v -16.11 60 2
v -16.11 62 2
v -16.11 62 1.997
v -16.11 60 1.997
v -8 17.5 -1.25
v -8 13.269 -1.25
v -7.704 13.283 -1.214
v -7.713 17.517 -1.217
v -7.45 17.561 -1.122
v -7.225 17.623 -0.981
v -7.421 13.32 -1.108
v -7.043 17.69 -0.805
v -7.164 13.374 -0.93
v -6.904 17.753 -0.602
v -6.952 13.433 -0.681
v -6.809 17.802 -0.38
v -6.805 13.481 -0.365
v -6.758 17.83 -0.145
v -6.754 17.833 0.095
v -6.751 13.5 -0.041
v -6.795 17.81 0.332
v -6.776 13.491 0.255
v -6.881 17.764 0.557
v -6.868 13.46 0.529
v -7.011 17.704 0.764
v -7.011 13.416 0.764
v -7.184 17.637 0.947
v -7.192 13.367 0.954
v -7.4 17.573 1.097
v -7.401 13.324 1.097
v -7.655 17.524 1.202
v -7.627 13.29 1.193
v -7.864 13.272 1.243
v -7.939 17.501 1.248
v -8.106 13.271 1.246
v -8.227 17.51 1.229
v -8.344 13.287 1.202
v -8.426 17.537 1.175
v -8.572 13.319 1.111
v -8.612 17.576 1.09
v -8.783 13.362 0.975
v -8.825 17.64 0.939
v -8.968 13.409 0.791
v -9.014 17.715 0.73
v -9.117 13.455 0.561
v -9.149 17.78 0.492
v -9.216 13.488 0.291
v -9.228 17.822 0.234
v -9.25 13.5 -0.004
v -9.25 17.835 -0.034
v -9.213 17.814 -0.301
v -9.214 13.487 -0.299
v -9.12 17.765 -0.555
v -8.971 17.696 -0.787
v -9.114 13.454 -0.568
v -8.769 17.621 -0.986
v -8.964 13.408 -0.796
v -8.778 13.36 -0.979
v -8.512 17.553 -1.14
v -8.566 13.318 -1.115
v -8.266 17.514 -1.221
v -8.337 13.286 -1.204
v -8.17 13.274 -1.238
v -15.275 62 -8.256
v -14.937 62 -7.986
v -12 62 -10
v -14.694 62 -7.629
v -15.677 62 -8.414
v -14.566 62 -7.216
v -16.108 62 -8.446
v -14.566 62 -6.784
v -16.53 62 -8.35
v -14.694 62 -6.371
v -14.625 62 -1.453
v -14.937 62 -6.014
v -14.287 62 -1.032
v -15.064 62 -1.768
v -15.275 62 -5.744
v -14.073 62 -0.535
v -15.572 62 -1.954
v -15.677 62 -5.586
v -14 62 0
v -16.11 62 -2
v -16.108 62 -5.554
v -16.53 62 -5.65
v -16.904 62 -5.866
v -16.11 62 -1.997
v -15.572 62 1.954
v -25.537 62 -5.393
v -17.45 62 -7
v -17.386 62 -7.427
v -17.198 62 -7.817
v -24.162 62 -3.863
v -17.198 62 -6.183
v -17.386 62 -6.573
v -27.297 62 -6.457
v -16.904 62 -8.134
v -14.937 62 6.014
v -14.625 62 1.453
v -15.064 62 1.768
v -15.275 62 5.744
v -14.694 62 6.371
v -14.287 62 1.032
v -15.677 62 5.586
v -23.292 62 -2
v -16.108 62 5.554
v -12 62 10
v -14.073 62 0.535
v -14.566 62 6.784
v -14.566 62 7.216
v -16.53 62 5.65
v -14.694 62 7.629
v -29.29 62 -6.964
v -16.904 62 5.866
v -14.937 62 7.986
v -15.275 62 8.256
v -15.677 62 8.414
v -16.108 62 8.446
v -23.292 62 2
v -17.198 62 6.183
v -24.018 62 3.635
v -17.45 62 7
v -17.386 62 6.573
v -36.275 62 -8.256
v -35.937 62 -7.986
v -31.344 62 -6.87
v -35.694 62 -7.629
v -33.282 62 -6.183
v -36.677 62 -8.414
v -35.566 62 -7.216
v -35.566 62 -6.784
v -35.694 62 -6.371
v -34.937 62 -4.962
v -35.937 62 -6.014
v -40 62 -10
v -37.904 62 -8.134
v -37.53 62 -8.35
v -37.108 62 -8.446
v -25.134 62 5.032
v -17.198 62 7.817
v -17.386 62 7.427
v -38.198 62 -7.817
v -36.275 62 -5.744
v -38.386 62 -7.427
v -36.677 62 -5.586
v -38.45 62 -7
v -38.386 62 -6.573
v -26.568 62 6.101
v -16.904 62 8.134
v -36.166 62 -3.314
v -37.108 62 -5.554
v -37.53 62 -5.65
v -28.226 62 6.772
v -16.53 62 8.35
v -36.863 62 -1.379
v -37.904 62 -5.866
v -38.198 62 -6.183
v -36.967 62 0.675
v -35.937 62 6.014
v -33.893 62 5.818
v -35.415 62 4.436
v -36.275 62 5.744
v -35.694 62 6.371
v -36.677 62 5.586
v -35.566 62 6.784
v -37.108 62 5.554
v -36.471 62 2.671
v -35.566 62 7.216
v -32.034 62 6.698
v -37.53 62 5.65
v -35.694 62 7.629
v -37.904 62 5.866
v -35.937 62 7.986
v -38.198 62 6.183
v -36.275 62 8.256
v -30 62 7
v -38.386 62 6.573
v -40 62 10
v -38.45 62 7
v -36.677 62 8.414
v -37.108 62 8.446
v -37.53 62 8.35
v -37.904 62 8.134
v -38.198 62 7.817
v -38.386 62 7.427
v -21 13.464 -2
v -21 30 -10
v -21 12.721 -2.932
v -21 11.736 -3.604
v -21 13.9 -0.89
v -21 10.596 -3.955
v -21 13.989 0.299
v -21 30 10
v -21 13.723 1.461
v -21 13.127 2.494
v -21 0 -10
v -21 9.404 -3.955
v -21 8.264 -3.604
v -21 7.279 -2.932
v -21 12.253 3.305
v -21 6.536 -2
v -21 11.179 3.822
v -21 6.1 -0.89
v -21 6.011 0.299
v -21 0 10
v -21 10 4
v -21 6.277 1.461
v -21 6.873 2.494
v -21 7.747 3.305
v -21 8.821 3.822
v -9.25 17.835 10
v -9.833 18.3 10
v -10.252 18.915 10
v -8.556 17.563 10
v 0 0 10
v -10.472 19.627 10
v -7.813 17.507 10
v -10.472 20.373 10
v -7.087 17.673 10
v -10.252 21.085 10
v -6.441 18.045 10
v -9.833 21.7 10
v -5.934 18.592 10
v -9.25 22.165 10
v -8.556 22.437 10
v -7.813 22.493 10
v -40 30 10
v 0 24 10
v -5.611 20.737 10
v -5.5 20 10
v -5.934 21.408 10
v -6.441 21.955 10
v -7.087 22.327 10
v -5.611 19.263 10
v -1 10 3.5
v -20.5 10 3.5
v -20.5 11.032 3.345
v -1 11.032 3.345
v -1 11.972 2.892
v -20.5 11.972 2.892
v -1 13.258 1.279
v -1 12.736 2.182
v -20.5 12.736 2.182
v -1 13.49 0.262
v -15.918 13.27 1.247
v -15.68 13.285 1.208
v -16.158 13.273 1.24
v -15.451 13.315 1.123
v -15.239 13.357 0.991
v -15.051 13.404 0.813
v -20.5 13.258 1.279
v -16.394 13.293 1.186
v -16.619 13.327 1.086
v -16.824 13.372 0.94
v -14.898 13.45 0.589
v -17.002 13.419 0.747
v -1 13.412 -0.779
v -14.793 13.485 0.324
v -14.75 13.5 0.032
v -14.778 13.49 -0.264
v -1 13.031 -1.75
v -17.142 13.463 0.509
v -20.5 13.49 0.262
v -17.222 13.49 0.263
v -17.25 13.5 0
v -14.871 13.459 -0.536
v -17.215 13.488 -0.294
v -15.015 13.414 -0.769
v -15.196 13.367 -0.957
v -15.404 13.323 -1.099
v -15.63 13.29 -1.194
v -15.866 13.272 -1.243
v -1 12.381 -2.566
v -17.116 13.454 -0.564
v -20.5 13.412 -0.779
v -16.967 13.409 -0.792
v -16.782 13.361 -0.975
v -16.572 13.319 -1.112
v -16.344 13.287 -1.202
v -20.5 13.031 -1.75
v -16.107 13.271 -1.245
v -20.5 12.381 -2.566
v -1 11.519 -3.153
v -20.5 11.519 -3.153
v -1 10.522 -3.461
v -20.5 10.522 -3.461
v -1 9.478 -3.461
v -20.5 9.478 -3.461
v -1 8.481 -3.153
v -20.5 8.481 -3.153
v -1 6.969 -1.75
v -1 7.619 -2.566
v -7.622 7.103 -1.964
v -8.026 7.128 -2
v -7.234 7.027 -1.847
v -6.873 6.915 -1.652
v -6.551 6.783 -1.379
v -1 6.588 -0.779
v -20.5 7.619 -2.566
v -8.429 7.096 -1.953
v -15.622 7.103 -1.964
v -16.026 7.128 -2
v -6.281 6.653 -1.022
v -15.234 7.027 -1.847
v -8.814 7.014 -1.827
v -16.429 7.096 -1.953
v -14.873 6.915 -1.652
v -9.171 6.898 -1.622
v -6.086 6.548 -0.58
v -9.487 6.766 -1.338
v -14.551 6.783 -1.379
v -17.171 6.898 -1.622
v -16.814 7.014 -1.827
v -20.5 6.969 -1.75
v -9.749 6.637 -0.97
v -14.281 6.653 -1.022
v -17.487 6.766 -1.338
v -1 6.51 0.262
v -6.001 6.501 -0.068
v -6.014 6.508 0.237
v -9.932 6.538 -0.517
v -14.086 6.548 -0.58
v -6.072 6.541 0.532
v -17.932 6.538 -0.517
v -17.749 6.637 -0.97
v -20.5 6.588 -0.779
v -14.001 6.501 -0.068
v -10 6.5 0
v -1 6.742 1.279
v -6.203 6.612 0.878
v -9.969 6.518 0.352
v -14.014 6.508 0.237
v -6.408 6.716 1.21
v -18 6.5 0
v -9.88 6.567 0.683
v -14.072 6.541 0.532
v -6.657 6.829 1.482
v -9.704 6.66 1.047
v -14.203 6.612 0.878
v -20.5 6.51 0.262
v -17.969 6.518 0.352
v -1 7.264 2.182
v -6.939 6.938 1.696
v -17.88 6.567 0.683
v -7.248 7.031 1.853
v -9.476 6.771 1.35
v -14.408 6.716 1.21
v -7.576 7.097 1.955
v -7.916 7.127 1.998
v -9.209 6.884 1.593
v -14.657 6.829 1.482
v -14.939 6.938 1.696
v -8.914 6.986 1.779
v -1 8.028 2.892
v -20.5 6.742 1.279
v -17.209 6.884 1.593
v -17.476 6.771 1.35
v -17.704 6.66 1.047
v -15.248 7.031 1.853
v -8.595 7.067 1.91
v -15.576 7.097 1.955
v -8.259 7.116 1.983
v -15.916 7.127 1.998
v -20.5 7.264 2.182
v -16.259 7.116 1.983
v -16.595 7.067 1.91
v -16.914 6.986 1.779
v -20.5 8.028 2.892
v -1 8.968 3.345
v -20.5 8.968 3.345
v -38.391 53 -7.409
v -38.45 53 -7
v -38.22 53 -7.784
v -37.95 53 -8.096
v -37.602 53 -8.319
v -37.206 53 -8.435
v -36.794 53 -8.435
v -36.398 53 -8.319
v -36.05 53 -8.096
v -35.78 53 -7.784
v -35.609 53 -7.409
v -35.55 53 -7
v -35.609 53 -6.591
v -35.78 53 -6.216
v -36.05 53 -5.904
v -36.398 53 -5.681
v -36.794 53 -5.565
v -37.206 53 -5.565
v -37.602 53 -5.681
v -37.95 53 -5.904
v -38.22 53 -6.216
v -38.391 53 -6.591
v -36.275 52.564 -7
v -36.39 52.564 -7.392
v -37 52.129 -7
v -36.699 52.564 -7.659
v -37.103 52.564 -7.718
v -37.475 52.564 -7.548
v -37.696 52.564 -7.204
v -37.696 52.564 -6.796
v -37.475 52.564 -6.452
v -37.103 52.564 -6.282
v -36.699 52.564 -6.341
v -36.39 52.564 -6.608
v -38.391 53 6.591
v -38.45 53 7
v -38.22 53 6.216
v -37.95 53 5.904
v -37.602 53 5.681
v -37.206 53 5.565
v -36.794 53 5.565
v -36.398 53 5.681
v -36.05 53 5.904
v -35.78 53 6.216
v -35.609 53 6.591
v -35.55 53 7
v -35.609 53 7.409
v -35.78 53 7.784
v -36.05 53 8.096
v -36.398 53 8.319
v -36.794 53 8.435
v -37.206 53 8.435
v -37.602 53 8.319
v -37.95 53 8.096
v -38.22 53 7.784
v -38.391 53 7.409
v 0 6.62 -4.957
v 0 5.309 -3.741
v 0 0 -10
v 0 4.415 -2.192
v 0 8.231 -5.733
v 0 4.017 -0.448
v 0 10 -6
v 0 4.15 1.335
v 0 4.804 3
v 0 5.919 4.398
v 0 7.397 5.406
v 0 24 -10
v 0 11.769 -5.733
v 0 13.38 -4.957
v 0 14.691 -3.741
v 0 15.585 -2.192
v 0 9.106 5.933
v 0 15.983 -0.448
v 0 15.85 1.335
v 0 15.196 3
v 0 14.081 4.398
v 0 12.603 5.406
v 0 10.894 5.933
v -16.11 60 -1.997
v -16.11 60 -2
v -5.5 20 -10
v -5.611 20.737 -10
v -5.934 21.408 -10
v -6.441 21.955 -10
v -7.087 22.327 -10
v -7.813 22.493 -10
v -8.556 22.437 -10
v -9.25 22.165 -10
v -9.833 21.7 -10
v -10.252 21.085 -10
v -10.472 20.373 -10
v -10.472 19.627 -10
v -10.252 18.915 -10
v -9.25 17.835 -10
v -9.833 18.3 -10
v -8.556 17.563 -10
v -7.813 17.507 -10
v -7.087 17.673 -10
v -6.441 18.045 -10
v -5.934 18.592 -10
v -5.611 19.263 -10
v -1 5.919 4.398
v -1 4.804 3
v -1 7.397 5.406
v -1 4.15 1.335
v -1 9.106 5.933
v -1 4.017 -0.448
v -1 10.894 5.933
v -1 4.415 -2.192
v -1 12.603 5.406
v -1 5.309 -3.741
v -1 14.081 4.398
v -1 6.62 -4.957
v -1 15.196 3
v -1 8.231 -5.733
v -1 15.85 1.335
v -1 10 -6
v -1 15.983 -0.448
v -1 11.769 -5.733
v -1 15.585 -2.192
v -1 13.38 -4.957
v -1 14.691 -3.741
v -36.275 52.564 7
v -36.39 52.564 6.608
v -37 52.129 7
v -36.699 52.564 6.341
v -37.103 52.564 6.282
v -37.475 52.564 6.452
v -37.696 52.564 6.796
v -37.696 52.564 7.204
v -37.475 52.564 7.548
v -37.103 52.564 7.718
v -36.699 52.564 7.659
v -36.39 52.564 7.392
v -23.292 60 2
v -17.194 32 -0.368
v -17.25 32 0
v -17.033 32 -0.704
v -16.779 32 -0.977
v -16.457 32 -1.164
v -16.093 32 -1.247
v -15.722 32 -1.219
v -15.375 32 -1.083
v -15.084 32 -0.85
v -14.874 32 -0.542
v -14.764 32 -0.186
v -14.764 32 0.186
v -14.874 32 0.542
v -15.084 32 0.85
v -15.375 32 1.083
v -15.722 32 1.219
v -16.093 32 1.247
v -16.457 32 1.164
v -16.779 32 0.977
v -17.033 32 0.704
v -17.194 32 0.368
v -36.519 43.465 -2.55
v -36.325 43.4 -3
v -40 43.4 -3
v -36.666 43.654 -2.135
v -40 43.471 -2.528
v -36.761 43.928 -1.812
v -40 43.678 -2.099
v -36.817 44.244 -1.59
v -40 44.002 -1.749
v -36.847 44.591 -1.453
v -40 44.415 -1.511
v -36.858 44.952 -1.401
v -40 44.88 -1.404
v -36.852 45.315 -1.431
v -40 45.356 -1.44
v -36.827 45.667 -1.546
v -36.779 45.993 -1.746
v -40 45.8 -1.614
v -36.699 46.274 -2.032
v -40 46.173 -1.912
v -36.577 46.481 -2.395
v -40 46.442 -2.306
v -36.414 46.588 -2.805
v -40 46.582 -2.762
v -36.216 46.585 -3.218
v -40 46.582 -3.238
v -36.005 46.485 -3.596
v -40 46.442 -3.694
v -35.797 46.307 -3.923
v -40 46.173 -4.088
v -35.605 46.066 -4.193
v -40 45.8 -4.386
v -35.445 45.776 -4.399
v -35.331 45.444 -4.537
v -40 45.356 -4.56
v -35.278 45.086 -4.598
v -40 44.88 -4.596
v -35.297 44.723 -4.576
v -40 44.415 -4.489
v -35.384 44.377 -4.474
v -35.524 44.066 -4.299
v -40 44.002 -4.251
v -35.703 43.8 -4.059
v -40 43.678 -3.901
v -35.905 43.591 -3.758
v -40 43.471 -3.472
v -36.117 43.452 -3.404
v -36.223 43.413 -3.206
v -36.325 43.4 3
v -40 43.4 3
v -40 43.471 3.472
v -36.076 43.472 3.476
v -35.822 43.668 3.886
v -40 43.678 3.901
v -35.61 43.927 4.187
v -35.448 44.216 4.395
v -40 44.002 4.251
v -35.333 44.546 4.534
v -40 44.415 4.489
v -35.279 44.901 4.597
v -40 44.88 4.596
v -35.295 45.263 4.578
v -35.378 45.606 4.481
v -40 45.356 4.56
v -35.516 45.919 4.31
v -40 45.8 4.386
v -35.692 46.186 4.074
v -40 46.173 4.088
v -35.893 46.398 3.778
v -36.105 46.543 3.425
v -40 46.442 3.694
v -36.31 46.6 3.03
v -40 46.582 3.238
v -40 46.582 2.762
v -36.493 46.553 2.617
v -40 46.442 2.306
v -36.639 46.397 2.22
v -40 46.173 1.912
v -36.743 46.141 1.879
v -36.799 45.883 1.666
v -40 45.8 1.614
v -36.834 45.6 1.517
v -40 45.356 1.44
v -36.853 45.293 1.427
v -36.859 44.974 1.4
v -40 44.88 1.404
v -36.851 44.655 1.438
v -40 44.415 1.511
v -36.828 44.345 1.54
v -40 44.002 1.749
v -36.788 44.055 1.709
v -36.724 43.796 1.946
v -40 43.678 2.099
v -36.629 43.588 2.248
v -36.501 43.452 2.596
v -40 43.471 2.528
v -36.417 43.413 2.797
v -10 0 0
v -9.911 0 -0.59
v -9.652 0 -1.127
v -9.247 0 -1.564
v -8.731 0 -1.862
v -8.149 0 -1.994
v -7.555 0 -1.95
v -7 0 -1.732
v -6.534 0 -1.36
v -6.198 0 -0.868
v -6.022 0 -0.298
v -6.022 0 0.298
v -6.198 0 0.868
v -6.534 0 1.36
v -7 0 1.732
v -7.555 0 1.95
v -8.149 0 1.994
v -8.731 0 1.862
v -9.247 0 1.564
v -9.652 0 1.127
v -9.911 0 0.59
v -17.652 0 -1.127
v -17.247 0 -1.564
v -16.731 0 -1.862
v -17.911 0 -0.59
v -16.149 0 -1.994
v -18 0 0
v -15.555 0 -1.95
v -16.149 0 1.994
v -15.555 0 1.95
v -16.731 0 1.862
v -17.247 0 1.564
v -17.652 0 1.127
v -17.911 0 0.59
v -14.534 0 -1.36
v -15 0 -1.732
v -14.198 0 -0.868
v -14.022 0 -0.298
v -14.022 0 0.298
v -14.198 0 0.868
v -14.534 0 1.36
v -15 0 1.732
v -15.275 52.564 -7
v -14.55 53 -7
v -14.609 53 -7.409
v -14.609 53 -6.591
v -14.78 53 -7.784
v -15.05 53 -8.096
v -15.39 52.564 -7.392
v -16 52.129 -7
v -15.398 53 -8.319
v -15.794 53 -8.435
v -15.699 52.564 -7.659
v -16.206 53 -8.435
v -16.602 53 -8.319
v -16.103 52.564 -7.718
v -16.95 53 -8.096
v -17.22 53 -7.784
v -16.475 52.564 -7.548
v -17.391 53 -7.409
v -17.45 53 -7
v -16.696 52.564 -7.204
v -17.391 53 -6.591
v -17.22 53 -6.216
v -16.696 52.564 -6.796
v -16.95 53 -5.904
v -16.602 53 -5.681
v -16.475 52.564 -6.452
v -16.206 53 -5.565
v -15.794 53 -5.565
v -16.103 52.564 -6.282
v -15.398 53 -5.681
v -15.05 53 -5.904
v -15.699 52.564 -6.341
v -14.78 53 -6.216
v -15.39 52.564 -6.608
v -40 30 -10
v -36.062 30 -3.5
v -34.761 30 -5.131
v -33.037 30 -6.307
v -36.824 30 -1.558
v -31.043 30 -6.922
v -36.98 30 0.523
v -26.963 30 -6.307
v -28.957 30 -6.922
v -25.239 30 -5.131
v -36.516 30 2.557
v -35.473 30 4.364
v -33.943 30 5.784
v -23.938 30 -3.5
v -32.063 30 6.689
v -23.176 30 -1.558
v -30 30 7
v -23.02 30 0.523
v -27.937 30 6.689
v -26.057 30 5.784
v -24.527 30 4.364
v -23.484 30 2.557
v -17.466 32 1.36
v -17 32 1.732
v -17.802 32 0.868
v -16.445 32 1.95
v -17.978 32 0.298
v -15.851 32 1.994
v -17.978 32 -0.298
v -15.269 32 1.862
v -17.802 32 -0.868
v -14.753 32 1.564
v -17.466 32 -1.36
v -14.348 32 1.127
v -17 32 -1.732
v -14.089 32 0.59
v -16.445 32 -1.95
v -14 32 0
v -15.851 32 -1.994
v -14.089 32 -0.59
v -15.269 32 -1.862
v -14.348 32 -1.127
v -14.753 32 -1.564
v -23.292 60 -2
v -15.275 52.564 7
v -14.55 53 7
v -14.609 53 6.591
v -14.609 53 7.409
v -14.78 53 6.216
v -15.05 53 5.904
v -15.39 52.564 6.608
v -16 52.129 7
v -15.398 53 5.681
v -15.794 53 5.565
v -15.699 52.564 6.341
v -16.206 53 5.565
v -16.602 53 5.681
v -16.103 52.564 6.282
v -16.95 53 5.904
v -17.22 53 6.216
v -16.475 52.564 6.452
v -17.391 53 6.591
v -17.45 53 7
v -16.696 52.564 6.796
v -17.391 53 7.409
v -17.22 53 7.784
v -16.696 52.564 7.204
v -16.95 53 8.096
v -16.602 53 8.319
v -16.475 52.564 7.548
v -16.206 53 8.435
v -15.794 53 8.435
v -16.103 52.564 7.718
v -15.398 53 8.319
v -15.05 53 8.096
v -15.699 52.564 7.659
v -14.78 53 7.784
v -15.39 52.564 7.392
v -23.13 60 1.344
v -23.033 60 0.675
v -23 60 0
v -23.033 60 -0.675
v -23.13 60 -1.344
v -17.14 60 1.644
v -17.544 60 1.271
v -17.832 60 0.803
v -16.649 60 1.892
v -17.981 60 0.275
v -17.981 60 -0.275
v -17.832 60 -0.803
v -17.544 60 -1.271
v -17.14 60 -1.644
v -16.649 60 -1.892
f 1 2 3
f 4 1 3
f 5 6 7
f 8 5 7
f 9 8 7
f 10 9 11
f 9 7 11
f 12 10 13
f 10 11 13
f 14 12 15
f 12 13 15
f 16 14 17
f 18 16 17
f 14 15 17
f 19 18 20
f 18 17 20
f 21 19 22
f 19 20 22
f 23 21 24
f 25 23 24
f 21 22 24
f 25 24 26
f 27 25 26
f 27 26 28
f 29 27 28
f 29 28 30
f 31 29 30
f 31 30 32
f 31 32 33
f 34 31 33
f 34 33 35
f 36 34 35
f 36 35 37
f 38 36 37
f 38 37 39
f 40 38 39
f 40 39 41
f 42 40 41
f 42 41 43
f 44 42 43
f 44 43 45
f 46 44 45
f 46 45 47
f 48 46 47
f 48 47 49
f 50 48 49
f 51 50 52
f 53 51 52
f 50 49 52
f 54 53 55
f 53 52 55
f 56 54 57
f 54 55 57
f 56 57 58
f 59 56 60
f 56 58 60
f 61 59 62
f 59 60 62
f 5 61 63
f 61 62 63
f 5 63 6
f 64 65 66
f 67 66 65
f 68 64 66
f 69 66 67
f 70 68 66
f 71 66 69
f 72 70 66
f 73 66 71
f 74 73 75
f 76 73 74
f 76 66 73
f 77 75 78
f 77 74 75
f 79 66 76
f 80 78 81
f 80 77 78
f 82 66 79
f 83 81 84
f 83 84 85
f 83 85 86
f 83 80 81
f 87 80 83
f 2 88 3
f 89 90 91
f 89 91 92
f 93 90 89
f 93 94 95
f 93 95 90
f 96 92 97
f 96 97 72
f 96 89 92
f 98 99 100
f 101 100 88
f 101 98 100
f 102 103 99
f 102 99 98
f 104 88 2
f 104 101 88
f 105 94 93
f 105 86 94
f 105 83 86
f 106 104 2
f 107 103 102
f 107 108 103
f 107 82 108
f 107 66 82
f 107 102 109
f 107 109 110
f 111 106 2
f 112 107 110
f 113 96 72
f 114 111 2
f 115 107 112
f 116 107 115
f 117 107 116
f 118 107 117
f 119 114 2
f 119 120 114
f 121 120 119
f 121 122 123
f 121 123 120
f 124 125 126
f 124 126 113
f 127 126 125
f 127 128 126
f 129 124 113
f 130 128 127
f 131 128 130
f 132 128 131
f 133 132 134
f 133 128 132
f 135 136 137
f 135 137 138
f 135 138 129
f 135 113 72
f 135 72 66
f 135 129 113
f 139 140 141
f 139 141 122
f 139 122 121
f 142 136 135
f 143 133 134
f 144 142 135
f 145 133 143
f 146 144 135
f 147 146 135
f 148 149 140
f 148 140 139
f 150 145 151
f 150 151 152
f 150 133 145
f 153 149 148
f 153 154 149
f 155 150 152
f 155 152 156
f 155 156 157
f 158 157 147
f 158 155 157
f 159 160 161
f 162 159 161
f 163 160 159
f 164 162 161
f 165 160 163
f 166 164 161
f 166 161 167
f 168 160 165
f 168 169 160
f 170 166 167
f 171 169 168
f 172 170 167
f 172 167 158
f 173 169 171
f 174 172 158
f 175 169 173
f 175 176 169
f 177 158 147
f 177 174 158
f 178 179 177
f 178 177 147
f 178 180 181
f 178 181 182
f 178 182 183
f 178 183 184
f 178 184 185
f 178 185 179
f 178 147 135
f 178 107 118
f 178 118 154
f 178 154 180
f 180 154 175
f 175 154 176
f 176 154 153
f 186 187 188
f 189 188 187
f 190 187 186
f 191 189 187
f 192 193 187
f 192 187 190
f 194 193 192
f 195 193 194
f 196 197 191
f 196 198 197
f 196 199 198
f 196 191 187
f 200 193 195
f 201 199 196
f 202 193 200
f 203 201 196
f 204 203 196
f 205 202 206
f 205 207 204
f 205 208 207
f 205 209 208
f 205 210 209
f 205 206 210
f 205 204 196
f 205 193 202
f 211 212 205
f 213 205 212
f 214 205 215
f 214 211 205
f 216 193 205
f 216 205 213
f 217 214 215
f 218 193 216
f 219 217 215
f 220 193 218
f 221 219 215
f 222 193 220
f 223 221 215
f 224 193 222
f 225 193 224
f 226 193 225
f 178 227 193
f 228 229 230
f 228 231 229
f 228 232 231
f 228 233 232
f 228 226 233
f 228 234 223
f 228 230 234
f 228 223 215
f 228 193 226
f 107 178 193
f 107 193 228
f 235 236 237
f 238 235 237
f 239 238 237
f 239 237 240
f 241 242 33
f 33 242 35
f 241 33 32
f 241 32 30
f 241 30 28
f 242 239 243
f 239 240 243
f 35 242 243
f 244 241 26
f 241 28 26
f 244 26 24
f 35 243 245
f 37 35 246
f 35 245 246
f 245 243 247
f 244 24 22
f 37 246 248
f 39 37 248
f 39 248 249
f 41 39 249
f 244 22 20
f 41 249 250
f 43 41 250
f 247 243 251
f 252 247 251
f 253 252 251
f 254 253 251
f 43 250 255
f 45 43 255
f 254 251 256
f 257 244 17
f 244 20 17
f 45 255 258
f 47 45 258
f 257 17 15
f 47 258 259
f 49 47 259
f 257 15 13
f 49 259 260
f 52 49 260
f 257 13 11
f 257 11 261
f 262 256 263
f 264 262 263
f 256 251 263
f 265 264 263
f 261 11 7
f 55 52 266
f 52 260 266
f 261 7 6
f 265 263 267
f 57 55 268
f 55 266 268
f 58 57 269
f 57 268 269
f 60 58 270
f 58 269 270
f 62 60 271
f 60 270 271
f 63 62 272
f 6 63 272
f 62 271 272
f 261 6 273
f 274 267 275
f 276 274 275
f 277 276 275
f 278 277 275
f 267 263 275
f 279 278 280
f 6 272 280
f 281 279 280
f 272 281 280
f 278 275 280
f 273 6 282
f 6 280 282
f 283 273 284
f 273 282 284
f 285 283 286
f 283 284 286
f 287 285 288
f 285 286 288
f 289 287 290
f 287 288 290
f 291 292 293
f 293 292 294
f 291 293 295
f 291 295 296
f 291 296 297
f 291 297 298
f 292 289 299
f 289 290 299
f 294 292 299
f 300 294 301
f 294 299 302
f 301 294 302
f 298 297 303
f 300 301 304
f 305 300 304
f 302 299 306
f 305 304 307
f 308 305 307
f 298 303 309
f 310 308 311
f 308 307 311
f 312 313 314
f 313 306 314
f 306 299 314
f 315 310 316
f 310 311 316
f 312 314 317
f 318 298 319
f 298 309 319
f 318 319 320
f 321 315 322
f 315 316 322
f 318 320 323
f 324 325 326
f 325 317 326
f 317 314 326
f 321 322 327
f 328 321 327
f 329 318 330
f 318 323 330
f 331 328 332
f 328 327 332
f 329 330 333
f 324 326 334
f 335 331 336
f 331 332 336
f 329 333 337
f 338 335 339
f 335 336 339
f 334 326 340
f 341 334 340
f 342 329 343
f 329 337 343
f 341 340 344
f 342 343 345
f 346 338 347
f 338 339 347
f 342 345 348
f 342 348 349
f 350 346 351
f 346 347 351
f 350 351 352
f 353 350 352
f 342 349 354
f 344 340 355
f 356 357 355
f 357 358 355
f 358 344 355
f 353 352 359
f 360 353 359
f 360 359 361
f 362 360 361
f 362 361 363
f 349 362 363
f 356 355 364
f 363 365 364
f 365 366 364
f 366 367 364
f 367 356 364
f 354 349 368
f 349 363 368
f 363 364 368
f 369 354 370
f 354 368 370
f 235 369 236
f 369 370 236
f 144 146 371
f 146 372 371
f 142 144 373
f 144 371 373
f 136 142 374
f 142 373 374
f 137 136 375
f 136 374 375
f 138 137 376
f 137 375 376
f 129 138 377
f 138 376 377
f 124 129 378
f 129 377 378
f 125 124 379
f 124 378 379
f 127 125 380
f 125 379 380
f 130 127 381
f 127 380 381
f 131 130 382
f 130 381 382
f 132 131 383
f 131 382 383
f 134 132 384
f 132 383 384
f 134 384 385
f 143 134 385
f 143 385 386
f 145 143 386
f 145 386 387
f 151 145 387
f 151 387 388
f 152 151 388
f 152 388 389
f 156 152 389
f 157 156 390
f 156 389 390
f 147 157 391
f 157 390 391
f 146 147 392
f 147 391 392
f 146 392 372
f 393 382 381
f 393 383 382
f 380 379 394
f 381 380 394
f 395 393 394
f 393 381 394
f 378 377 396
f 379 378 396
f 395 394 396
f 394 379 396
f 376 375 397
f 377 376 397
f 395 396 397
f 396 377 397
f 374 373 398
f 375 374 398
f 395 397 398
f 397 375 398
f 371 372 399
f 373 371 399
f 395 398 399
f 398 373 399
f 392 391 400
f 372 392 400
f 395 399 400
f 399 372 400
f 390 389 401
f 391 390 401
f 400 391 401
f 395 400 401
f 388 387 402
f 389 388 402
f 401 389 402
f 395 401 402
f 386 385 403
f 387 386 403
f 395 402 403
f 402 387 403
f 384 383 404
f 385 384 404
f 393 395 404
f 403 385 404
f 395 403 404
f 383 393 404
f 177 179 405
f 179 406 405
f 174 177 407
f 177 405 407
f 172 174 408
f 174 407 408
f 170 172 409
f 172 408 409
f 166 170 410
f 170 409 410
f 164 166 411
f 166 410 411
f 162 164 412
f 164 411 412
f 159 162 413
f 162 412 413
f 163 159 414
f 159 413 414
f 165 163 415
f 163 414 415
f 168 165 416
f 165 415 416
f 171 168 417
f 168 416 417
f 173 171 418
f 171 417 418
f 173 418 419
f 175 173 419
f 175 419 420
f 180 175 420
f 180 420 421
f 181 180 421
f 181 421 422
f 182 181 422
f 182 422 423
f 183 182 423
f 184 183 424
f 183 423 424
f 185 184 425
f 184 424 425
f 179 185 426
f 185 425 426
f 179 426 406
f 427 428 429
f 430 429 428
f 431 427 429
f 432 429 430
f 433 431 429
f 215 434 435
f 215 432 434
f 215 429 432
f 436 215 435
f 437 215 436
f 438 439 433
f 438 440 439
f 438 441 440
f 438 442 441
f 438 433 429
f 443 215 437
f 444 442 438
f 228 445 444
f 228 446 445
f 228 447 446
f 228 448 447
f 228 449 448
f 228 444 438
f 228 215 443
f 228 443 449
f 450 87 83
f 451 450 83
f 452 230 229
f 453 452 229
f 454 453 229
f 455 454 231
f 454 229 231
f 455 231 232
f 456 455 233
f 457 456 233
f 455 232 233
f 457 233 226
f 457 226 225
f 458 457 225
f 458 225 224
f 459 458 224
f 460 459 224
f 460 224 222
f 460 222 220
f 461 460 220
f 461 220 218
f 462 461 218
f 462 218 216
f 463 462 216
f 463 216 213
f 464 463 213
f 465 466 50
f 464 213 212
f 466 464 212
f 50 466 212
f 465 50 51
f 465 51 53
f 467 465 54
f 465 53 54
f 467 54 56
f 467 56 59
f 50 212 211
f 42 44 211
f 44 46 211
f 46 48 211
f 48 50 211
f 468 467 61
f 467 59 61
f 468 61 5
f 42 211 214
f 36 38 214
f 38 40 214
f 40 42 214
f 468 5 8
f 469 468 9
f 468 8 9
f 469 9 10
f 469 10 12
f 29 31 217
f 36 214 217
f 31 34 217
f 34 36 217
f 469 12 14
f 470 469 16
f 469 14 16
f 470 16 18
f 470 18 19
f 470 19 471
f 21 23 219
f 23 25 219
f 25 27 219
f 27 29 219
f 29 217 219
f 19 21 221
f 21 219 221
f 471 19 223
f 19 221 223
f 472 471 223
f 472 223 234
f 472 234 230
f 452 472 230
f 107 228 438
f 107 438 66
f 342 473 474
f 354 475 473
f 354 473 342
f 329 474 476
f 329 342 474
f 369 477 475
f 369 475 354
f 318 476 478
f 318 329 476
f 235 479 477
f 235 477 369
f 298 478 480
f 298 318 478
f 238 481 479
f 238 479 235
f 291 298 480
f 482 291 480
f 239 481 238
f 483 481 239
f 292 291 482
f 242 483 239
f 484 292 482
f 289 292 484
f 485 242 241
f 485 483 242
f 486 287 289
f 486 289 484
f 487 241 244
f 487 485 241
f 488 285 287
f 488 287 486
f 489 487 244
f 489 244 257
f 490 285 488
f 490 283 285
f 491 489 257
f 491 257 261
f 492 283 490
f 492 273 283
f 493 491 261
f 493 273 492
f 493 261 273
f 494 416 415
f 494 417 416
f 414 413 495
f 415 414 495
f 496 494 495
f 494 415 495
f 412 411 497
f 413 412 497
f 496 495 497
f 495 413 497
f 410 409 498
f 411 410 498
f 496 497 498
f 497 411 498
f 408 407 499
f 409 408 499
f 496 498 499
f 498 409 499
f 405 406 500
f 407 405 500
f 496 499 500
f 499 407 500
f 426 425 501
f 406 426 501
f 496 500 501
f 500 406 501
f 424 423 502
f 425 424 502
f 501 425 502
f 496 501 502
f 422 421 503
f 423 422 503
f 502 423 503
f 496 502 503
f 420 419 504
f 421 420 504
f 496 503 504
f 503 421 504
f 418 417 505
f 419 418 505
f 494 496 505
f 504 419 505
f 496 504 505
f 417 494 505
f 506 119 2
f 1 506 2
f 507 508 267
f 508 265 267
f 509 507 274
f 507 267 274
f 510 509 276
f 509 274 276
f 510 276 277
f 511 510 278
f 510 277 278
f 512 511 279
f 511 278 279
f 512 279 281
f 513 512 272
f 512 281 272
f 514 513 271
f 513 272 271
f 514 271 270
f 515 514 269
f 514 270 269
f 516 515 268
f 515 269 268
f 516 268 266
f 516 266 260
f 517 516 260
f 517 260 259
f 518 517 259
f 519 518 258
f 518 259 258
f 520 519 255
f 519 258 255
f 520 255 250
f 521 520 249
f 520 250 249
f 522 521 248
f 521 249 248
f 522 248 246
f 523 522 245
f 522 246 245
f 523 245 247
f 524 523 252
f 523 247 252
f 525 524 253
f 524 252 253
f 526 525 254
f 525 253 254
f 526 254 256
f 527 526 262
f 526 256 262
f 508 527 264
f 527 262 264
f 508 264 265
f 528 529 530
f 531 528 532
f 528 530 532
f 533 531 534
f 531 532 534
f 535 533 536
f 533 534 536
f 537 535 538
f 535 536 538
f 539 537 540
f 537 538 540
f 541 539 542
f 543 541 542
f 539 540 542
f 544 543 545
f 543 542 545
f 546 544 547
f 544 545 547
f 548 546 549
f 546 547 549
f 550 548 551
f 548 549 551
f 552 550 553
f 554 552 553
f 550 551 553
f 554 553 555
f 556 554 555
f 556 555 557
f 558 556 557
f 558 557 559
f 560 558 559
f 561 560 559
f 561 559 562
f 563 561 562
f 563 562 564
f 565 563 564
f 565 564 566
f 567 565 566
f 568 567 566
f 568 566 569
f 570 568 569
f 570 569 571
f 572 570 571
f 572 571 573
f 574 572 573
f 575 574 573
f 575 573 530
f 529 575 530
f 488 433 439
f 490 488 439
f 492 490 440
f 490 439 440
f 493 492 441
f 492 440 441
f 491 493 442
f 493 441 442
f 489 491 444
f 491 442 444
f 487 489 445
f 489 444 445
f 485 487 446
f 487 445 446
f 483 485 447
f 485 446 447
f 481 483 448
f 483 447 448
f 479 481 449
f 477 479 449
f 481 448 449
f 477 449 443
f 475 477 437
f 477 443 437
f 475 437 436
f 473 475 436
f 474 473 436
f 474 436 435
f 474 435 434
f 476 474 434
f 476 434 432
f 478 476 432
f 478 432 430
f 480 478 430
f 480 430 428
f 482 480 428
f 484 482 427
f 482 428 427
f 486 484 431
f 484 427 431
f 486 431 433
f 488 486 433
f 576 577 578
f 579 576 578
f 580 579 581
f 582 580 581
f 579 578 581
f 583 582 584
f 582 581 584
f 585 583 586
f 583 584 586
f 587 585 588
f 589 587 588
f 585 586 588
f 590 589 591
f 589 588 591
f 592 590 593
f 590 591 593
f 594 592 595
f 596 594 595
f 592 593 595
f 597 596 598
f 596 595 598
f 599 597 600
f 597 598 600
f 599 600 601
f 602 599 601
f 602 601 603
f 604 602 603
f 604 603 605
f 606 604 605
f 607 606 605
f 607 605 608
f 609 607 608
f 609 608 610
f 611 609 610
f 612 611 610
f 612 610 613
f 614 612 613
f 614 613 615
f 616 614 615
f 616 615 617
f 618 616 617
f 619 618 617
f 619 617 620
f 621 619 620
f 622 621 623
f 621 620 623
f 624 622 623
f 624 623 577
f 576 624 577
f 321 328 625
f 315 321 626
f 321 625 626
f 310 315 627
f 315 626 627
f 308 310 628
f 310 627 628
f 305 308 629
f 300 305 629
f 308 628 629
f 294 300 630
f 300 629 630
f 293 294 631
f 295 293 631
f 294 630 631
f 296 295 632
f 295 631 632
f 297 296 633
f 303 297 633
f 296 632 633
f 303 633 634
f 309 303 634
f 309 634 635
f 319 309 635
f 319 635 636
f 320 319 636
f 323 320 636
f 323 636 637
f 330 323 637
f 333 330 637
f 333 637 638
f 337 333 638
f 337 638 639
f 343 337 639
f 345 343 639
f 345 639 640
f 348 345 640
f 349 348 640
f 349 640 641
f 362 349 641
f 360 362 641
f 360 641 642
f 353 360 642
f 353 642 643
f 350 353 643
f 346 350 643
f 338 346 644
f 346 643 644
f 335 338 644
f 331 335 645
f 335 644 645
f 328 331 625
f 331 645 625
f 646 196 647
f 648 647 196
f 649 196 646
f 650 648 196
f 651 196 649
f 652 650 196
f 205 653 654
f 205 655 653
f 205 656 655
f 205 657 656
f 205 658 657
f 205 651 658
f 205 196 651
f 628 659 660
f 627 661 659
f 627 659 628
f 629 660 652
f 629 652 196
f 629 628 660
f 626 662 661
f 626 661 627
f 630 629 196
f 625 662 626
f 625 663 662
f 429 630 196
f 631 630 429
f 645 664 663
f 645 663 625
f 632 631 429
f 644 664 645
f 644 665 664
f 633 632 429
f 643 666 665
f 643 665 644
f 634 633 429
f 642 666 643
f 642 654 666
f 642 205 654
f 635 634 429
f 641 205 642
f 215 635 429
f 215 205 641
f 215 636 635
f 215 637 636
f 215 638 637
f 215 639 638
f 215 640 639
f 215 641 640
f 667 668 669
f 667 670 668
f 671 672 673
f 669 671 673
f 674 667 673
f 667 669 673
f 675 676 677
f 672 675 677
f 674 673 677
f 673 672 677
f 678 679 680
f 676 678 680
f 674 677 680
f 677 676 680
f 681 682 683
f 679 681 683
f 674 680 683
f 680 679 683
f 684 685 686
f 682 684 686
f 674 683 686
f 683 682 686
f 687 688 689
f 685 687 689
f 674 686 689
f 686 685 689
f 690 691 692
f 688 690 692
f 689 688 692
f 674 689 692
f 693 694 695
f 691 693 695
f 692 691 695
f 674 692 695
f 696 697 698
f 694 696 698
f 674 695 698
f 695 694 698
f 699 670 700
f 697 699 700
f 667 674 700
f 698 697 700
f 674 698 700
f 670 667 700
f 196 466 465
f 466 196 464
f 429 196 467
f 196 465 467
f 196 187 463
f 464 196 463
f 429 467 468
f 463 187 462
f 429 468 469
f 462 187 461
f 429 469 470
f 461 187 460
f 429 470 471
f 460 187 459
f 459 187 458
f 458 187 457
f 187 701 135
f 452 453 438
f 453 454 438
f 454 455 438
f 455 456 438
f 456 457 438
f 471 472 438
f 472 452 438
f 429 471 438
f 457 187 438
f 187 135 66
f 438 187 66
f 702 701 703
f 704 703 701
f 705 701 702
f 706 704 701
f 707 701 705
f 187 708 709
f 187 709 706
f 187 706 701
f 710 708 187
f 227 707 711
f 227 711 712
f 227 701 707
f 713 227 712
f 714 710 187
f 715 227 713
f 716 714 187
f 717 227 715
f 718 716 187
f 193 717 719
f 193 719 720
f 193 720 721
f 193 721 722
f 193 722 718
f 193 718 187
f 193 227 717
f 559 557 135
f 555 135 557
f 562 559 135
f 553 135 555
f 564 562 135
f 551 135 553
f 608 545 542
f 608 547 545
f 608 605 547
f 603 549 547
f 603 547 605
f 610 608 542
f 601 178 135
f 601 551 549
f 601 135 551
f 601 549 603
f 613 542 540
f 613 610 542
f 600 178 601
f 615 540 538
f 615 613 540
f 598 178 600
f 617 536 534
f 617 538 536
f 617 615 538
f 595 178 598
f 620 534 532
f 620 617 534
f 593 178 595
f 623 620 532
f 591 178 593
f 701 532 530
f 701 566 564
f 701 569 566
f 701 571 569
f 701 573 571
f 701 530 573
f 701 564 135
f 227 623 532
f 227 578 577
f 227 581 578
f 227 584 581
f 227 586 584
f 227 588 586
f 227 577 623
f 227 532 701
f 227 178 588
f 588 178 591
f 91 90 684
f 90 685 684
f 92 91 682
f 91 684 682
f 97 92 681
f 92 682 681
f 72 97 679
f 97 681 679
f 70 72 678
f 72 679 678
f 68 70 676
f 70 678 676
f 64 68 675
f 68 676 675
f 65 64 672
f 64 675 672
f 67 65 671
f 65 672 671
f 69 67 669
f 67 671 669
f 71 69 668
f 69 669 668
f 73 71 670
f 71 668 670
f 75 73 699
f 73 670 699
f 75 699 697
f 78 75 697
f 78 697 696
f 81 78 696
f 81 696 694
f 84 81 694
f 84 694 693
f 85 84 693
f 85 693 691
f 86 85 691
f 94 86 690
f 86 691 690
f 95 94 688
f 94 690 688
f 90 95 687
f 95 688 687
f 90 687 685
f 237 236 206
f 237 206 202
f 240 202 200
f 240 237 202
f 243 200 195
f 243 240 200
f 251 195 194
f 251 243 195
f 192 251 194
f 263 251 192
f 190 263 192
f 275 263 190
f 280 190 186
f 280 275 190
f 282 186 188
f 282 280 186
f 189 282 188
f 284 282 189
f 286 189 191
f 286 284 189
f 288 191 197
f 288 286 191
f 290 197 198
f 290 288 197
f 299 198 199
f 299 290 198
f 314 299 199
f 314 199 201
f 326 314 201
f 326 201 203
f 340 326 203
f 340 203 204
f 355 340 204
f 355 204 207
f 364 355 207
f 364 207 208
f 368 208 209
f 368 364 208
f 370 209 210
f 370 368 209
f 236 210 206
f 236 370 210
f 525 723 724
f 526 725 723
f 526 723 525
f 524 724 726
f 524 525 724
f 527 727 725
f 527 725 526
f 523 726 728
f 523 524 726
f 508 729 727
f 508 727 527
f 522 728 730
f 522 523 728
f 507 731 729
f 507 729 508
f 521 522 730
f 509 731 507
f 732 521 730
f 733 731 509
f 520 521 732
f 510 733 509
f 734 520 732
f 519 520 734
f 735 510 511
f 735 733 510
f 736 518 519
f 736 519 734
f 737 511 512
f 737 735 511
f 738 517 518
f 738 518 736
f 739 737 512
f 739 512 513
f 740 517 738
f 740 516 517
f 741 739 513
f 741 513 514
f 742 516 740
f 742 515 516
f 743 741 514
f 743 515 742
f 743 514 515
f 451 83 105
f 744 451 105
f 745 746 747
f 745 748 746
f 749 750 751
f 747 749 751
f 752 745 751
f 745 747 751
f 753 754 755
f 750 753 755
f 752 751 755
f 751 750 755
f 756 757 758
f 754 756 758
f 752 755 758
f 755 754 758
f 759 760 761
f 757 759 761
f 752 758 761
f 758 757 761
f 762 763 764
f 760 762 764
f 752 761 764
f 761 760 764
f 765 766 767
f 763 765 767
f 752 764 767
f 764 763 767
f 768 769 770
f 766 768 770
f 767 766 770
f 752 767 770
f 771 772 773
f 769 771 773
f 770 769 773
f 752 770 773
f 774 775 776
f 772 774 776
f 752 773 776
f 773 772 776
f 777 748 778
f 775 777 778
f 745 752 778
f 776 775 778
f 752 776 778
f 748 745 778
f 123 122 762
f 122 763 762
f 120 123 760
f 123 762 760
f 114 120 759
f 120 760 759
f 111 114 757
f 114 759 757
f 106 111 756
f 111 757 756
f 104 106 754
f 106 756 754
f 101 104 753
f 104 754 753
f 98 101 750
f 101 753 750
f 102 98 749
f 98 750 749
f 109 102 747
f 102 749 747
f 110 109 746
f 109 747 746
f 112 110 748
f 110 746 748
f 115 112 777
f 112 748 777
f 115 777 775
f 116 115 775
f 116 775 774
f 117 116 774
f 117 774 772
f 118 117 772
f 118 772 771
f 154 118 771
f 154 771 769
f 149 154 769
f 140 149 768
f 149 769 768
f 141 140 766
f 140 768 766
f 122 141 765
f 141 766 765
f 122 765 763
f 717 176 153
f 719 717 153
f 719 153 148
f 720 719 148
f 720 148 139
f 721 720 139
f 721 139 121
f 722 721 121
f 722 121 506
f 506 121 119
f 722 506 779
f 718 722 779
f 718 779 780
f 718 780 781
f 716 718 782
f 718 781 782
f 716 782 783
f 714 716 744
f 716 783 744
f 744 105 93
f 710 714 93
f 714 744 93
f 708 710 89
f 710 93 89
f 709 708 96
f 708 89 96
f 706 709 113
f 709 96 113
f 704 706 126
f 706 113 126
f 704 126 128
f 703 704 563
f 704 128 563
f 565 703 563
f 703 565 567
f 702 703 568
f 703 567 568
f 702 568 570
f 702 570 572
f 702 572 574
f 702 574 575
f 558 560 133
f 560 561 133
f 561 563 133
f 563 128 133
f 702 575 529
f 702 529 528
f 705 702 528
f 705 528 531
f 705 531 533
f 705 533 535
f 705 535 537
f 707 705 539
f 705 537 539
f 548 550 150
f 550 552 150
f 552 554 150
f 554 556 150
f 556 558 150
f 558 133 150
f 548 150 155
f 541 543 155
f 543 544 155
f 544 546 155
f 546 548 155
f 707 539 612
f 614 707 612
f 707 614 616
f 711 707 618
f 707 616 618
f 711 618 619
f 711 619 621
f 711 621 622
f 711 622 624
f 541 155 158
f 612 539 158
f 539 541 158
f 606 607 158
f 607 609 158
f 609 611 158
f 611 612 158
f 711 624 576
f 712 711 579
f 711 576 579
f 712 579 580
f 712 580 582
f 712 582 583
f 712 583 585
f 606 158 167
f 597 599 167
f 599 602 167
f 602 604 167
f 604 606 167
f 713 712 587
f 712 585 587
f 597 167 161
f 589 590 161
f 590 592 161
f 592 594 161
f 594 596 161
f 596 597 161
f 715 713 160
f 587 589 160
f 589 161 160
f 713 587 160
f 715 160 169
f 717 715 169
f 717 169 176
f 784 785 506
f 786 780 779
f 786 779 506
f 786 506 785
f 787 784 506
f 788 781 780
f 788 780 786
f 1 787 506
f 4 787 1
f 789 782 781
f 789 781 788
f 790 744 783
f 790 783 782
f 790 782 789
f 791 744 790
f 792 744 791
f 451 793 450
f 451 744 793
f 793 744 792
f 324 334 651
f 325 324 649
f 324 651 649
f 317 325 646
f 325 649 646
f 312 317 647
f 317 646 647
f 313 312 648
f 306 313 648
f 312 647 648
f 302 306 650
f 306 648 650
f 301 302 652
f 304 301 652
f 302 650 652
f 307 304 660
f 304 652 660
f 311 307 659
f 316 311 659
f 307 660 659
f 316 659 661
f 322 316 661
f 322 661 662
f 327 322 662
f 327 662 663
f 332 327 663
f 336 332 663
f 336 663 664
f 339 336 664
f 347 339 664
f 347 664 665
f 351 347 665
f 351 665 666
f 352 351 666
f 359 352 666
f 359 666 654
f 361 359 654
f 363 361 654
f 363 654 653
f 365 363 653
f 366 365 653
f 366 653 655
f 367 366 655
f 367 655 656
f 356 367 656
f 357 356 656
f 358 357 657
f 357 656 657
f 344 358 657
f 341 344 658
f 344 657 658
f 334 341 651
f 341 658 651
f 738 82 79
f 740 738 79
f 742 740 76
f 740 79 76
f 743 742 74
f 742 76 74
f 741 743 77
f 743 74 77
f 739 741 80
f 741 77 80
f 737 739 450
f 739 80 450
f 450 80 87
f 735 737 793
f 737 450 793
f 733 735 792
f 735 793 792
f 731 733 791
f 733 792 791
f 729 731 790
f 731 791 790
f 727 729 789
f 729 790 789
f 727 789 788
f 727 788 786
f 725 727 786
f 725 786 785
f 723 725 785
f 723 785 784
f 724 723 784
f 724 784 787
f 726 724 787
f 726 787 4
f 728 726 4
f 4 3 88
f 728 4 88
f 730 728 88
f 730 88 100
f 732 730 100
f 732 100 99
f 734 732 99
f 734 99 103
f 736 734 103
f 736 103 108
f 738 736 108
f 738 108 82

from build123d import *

# Parameters (mm, degrees)
BOSS_EXTRUDE1_DEPTH                                  = 10
CUT_EXTRUDE1_REACH                                   = 76.458
SKETCH2_R                                            = 7
CSK_FOR_M8_FLAT_HEAD_MACHINE_SCREW1_D                = 7
CSK_FOR_M8_FLAT_HEAD_MACHINE_SCREW1_CSINK_D          = 8
CSK_FOR_M8_FLAT_HEAD_MACHINE_SCREW1_CSINK_ANGLE      = 90
M4X0_7_TAPPED_HOLE1_REACH                            = 76.458
M4X0_7_TAPPED_HOLE1_BORE_R                           = 2
CUT_EXTRUDE2_REACH                                   = 78.446
SKETCH8_R                                            = 2.5
CUT_EXTRUDE3_REACH                                   = 76.458
CUT_EXTRUDE3_END_RADIUS                              = 2.5
SKETCH9_R                                            = 1.25
TAP_DRILL_FOR_M3_5X0_6_TAP1_D                        = 2.9
TAP_DRILL_FOR_M3_5X0_6_TAP1_DEPTH                    = 9
TAP_DRILL_FOR_M3_5X0_6_TAP1_TIP                      = 0.871247898
CUT_EXTRUDE4_REACH                                   = 76.458
CUT_EXTRUDE4_END_RADIUS                              = 7
SKETCH14_R                                           = 1.6
CBORE_FOR_M4_CROSS_RECESS_PAN_HEAD_SCREW_D           = 2.5
CBORE_FOR_M4_CROSS_RECESS_PAN_HEAD_SCREW_CBORE_D     = 4
CBORE_FOR_M4_CROSS_RECESS_PAN_HEAD_SCREW_CBORE_DEPTH = 30
CUT_EXTRUDE5_DEPTH                                   = 2
SKETCH18_R                                           = 6
CUT_EXTRUDE6_DEPTH                                   = 1
CHAMFER1_SIZE                                        = 0.5


with BuildPart() as part:
    # Sketch1 → Boss-Extrude1 (new, symmetric)
    with BuildSketch(Plane.XY):
        Polygon((0, 0), (0, 24), (-12, 62), (-40, 62), (-40, 30), (-21, 30), (-21, 0), align=None)
    extrude(amount=BOSS_EXTRUDE1_DEPTH, both=True)

    # Sketch2 → Cut-Extrude1 (cut, up to next)
    with BuildSketch(Plane(origin=(0, 62, 0), x_dir=(1, 0, 0), z_dir=(0, 1, 0)), mode=Mode.PRIVATE) as cut_extrude1_sk1:
        with Locations(Location((-30, 0, 0), (0, 0, 270))):
            Circle(SKETCH2_R)
    cut_extrude1_tool1 = extrude(cut_extrude1_sk1.sketch, amount=-CUT_EXTRUDE1_REACH, mode=Mode.PRIVATE) & part.part
    add(cut_extrude1_tool1.solids().sort_by_distance((-30, 62, 0))[0], mode=Mode.SUBTRACT)

    # CSK for M8 Flat Head Machine Screw1 (through all)
    with Locations(Plane(origin=(0, 0, 0), x_dir=(0, 0, -1), z_dir=(1, 0, 0))):
        with Locations((0, 10)):
            CounterSinkHole(CSK_FOR_M8_FLAT_HEAD_MACHINE_SCREW1_D / 2, CSK_FOR_M8_FLAT_HEAD_MACHINE_SCREW1_CSINK_D / 2, counter_sink_angle=CSK_FOR_M8_FLAT_HEAD_MACHINE_SCREW1_CSINK_ANGLE)

    # M4x0.7 Tapped Hole1 bore → M4x0.7 Tapped Hole1 (cut, up to next)
    with BuildSketch(Plane(origin=(0, 0, 0), x_dir=(-1, 0, 0), z_dir=(0, -1, 0)), mode=Mode.PRIVATE) as m4x0_7_tapped_hole1_sk1:
        with Locations((8, 0)):
            Circle(M4X0_7_TAPPED_HOLE1_BORE_R)
    m4x0_7_tapped_hole1_tool1 = extrude(m4x0_7_tapped_hole1_sk1.sketch, amount=-M4X0_7_TAPPED_HOLE1_REACH, mode=Mode.PRIVATE) & part.part
    # M4x0.7 Tapped Hole1 bore → M4x0.7 Tapped Hole1 (cut, up to next)
    with BuildSketch(Plane(origin=(0, 0, 0), x_dir=(-1, 0, 0), z_dir=(0, -1, 0)), mode=Mode.PRIVATE) as m4x0_7_tapped_hole1_sk2:
        with Locations((16, 0)):
            Circle(M4X0_7_TAPPED_HOLE1_BORE_R)
    m4x0_7_tapped_hole1_tool2 = extrude(m4x0_7_tapped_hole1_sk2.sketch, amount=-M4X0_7_TAPPED_HOLE1_REACH, mode=Mode.PRIVATE) & part.part
    add(m4x0_7_tapped_hole1_tool1.solids().sort_by_distance((-8, 0, 0))[0], mode=Mode.SUBTRACT)
    add(m4x0_7_tapped_hole1_tool2.solids().sort_by_distance((-16, 0, 0))[0], mode=Mode.SUBTRACT)

    # Sketch8 → Cut-Extrude2 (cut, up to next)
    with BuildSketch(Plane.XY.offset(10), mode=Mode.PRIVATE) as cut_extrude2_sk1:
        with Locations((-8, 20)):
            Circle(SKETCH8_R)
    cut_extrude2_tool1 = extrude(cut_extrude2_sk1.sketch, amount=-CUT_EXTRUDE2_REACH, mode=Mode.PRIVATE) & part.part
    add(cut_extrude2_tool1.solids().sort_by_distance((-8, 20, 10))[0], mode=Mode.SUBTRACT)

    # Cut-Extrude3: up to this cylinder (the profile starts outside it)
    cut_extrude3_end = Plane(origin=(-8, 20, 0), z_dir=(0, 0, 1)) * Cylinder(CUT_EXTRUDE3_END_RADIUS, 158.916, mode=Mode.PRIVATE)
    # Sketch9 → Cut-Extrude3 (cut, up to the surface)
    with BuildSketch(Plane.XZ, mode=Mode.PRIVATE) as cut_extrude3_sk1:
        with Locations(Location((-8, 0, 0), (0, 0, 270))):
            Circle(SKETCH9_R)
    cut_extrude3_tool1 = extrude(cut_extrude3_sk1.sketch, amount=-CUT_EXTRUDE3_REACH, mode=Mode.PRIVATE) - cut_extrude3_end
    add(cut_extrude3_tool1.solids().sort_by_distance((-8, 0, 0))[0], mode=Mode.SUBTRACT)

    # Tap Drill for M3.5x0.6 Tap1
    with Locations(Plane(origin=(0, 62, 0), x_dir=(1, 0, 0), z_dir=(0, 1, 0))):
        with Locations((-37, 7), (-16, 7), (-16, -7), (-37, -7)):
            Hole(TAP_DRILL_FOR_M3_5X0_6_TAP1_D / 2, depth=TAP_DRILL_FOR_M3_5X0_6_TAP1_DEPTH)
            with Locations((0, 0, -(TAP_DRILL_FOR_M3_5X0_6_TAP1_DEPTH + TAP_DRILL_FOR_M3_5X0_6_TAP1_TIP / 2))):  # 118° drill point
                Cone(0, TAP_DRILL_FOR_M3_5X0_6_TAP1_D / 2, TAP_DRILL_FOR_M3_5X0_6_TAP1_TIP, mode=Mode.SUBTRACT)

    # Cut-Extrude4: up to this cylinder (the profile starts outside it)
    cut_extrude4_end = Plane(origin=(-30, 45, 0), z_dir=(0, 1, 0)) * Cylinder(CUT_EXTRUDE4_END_RADIUS, 167.916, mode=Mode.PRIVATE)
    # Sketch14 → Cut-Extrude4 (cut, up to the surface)
    with BuildSketch(Plane.ZY.offset(40), mode=Mode.PRIVATE) as cut_extrude4_sk1:
        with Locations(Location((-3, 45, 0), (0, 0, 270))):
            Circle(SKETCH14_R)
    cut_extrude4_tool1 = extrude(cut_extrude4_sk1.sketch, amount=-CUT_EXTRUDE4_REACH, mode=Mode.PRIVATE) - cut_extrude4_end
    add(cut_extrude4_tool1.solids().sort_by_distance((-40, 45, -3))[0], mode=Mode.SUBTRACT)
    # Sketch14 → Cut-Extrude4 (cut, up to the surface)
    with BuildSketch(Plane.ZY.offset(40), mode=Mode.PRIVATE) as cut_extrude4_sk2:
        with Locations(Location((3, 45, 0), (0, 0, 270))):
            Circle(SKETCH14_R)
    cut_extrude4_tool2 = extrude(cut_extrude4_sk2.sketch, amount=-CUT_EXTRUDE4_REACH, mode=Mode.PRIVATE) - cut_extrude4_end
    add(cut_extrude4_tool2.solids().sort_by_distance((-40, 45, 3))[0], mode=Mode.SUBTRACT)

    # CBORE for M4 Cross Recess Pan Head Screw1 (through all)
    with Locations(Plane(origin=(0, 62, 0), x_dir=(1, 0, 0), z_dir=(0, 1, 0))):
        with Locations((-16, 0)):
            CounterBoreHole(CBORE_FOR_M4_CROSS_RECESS_PAN_HEAD_SCREW_D / 2, CBORE_FOR_M4_CROSS_RECESS_PAN_HEAD_SCREW_CBORE_D / 2, CBORE_FOR_M4_CROSS_RECESS_PAN_HEAD_SCREW_CBORE_DEPTH)

    # Sketch17 → Cut-Extrude5 (cut)
    with BuildSketch(Plane(origin=(0, 62, 0), x_dir=(1, 0, 0), z_dir=(0, 1, 0))):
        with BuildLine():
            Line((-16.110062598, 1.99696926), (-16.110062598, 2))
            Line((-16.110062598, 2), (-23.291796068, 2))
            ThreePointArc((-23.291796068, 2), (-23.073333142, 1.010587075), (-23, 0))
            ThreePointArc((-23, 0), (-23.073333142, -1.010587075), (-23.291796068, -2))
            Line((-23.291796068, -2), (-16.110062598, -2))
            Line((-16.110062598, -2), (-16.110062598, -1.99696926))
            ThreePointArc((-16.110062598, -1.99696926), (-18, 0), (-16.110062598, 1.99696926))
        make_face()
    extrude(amount=-CUT_EXTRUDE5_DEPTH, mode=Mode.SUBTRACT)

    # Sketch18 → Cut-Extrude6 (cut)
    with BuildSketch(Plane(origin=(0, 0, 0), x_dir=(0, 0, -1), z_dir=(1, 0, 0))):
        with Locations((0, 10)):
            Circle(SKETCH18_R)
    extrude(amount=-CUT_EXTRUDE6_DEPTH, mode=Mode.SUBTRACT)

    # Chamfer1
    chamfer1_edges = [part.edges().sort_by_distance(p)[0] for p in [
        (-21, 10, -3.5),
    ]]
    chamfer(chamfer1_edges, length=CHAMFER1_SIZE)


solid = part.part
